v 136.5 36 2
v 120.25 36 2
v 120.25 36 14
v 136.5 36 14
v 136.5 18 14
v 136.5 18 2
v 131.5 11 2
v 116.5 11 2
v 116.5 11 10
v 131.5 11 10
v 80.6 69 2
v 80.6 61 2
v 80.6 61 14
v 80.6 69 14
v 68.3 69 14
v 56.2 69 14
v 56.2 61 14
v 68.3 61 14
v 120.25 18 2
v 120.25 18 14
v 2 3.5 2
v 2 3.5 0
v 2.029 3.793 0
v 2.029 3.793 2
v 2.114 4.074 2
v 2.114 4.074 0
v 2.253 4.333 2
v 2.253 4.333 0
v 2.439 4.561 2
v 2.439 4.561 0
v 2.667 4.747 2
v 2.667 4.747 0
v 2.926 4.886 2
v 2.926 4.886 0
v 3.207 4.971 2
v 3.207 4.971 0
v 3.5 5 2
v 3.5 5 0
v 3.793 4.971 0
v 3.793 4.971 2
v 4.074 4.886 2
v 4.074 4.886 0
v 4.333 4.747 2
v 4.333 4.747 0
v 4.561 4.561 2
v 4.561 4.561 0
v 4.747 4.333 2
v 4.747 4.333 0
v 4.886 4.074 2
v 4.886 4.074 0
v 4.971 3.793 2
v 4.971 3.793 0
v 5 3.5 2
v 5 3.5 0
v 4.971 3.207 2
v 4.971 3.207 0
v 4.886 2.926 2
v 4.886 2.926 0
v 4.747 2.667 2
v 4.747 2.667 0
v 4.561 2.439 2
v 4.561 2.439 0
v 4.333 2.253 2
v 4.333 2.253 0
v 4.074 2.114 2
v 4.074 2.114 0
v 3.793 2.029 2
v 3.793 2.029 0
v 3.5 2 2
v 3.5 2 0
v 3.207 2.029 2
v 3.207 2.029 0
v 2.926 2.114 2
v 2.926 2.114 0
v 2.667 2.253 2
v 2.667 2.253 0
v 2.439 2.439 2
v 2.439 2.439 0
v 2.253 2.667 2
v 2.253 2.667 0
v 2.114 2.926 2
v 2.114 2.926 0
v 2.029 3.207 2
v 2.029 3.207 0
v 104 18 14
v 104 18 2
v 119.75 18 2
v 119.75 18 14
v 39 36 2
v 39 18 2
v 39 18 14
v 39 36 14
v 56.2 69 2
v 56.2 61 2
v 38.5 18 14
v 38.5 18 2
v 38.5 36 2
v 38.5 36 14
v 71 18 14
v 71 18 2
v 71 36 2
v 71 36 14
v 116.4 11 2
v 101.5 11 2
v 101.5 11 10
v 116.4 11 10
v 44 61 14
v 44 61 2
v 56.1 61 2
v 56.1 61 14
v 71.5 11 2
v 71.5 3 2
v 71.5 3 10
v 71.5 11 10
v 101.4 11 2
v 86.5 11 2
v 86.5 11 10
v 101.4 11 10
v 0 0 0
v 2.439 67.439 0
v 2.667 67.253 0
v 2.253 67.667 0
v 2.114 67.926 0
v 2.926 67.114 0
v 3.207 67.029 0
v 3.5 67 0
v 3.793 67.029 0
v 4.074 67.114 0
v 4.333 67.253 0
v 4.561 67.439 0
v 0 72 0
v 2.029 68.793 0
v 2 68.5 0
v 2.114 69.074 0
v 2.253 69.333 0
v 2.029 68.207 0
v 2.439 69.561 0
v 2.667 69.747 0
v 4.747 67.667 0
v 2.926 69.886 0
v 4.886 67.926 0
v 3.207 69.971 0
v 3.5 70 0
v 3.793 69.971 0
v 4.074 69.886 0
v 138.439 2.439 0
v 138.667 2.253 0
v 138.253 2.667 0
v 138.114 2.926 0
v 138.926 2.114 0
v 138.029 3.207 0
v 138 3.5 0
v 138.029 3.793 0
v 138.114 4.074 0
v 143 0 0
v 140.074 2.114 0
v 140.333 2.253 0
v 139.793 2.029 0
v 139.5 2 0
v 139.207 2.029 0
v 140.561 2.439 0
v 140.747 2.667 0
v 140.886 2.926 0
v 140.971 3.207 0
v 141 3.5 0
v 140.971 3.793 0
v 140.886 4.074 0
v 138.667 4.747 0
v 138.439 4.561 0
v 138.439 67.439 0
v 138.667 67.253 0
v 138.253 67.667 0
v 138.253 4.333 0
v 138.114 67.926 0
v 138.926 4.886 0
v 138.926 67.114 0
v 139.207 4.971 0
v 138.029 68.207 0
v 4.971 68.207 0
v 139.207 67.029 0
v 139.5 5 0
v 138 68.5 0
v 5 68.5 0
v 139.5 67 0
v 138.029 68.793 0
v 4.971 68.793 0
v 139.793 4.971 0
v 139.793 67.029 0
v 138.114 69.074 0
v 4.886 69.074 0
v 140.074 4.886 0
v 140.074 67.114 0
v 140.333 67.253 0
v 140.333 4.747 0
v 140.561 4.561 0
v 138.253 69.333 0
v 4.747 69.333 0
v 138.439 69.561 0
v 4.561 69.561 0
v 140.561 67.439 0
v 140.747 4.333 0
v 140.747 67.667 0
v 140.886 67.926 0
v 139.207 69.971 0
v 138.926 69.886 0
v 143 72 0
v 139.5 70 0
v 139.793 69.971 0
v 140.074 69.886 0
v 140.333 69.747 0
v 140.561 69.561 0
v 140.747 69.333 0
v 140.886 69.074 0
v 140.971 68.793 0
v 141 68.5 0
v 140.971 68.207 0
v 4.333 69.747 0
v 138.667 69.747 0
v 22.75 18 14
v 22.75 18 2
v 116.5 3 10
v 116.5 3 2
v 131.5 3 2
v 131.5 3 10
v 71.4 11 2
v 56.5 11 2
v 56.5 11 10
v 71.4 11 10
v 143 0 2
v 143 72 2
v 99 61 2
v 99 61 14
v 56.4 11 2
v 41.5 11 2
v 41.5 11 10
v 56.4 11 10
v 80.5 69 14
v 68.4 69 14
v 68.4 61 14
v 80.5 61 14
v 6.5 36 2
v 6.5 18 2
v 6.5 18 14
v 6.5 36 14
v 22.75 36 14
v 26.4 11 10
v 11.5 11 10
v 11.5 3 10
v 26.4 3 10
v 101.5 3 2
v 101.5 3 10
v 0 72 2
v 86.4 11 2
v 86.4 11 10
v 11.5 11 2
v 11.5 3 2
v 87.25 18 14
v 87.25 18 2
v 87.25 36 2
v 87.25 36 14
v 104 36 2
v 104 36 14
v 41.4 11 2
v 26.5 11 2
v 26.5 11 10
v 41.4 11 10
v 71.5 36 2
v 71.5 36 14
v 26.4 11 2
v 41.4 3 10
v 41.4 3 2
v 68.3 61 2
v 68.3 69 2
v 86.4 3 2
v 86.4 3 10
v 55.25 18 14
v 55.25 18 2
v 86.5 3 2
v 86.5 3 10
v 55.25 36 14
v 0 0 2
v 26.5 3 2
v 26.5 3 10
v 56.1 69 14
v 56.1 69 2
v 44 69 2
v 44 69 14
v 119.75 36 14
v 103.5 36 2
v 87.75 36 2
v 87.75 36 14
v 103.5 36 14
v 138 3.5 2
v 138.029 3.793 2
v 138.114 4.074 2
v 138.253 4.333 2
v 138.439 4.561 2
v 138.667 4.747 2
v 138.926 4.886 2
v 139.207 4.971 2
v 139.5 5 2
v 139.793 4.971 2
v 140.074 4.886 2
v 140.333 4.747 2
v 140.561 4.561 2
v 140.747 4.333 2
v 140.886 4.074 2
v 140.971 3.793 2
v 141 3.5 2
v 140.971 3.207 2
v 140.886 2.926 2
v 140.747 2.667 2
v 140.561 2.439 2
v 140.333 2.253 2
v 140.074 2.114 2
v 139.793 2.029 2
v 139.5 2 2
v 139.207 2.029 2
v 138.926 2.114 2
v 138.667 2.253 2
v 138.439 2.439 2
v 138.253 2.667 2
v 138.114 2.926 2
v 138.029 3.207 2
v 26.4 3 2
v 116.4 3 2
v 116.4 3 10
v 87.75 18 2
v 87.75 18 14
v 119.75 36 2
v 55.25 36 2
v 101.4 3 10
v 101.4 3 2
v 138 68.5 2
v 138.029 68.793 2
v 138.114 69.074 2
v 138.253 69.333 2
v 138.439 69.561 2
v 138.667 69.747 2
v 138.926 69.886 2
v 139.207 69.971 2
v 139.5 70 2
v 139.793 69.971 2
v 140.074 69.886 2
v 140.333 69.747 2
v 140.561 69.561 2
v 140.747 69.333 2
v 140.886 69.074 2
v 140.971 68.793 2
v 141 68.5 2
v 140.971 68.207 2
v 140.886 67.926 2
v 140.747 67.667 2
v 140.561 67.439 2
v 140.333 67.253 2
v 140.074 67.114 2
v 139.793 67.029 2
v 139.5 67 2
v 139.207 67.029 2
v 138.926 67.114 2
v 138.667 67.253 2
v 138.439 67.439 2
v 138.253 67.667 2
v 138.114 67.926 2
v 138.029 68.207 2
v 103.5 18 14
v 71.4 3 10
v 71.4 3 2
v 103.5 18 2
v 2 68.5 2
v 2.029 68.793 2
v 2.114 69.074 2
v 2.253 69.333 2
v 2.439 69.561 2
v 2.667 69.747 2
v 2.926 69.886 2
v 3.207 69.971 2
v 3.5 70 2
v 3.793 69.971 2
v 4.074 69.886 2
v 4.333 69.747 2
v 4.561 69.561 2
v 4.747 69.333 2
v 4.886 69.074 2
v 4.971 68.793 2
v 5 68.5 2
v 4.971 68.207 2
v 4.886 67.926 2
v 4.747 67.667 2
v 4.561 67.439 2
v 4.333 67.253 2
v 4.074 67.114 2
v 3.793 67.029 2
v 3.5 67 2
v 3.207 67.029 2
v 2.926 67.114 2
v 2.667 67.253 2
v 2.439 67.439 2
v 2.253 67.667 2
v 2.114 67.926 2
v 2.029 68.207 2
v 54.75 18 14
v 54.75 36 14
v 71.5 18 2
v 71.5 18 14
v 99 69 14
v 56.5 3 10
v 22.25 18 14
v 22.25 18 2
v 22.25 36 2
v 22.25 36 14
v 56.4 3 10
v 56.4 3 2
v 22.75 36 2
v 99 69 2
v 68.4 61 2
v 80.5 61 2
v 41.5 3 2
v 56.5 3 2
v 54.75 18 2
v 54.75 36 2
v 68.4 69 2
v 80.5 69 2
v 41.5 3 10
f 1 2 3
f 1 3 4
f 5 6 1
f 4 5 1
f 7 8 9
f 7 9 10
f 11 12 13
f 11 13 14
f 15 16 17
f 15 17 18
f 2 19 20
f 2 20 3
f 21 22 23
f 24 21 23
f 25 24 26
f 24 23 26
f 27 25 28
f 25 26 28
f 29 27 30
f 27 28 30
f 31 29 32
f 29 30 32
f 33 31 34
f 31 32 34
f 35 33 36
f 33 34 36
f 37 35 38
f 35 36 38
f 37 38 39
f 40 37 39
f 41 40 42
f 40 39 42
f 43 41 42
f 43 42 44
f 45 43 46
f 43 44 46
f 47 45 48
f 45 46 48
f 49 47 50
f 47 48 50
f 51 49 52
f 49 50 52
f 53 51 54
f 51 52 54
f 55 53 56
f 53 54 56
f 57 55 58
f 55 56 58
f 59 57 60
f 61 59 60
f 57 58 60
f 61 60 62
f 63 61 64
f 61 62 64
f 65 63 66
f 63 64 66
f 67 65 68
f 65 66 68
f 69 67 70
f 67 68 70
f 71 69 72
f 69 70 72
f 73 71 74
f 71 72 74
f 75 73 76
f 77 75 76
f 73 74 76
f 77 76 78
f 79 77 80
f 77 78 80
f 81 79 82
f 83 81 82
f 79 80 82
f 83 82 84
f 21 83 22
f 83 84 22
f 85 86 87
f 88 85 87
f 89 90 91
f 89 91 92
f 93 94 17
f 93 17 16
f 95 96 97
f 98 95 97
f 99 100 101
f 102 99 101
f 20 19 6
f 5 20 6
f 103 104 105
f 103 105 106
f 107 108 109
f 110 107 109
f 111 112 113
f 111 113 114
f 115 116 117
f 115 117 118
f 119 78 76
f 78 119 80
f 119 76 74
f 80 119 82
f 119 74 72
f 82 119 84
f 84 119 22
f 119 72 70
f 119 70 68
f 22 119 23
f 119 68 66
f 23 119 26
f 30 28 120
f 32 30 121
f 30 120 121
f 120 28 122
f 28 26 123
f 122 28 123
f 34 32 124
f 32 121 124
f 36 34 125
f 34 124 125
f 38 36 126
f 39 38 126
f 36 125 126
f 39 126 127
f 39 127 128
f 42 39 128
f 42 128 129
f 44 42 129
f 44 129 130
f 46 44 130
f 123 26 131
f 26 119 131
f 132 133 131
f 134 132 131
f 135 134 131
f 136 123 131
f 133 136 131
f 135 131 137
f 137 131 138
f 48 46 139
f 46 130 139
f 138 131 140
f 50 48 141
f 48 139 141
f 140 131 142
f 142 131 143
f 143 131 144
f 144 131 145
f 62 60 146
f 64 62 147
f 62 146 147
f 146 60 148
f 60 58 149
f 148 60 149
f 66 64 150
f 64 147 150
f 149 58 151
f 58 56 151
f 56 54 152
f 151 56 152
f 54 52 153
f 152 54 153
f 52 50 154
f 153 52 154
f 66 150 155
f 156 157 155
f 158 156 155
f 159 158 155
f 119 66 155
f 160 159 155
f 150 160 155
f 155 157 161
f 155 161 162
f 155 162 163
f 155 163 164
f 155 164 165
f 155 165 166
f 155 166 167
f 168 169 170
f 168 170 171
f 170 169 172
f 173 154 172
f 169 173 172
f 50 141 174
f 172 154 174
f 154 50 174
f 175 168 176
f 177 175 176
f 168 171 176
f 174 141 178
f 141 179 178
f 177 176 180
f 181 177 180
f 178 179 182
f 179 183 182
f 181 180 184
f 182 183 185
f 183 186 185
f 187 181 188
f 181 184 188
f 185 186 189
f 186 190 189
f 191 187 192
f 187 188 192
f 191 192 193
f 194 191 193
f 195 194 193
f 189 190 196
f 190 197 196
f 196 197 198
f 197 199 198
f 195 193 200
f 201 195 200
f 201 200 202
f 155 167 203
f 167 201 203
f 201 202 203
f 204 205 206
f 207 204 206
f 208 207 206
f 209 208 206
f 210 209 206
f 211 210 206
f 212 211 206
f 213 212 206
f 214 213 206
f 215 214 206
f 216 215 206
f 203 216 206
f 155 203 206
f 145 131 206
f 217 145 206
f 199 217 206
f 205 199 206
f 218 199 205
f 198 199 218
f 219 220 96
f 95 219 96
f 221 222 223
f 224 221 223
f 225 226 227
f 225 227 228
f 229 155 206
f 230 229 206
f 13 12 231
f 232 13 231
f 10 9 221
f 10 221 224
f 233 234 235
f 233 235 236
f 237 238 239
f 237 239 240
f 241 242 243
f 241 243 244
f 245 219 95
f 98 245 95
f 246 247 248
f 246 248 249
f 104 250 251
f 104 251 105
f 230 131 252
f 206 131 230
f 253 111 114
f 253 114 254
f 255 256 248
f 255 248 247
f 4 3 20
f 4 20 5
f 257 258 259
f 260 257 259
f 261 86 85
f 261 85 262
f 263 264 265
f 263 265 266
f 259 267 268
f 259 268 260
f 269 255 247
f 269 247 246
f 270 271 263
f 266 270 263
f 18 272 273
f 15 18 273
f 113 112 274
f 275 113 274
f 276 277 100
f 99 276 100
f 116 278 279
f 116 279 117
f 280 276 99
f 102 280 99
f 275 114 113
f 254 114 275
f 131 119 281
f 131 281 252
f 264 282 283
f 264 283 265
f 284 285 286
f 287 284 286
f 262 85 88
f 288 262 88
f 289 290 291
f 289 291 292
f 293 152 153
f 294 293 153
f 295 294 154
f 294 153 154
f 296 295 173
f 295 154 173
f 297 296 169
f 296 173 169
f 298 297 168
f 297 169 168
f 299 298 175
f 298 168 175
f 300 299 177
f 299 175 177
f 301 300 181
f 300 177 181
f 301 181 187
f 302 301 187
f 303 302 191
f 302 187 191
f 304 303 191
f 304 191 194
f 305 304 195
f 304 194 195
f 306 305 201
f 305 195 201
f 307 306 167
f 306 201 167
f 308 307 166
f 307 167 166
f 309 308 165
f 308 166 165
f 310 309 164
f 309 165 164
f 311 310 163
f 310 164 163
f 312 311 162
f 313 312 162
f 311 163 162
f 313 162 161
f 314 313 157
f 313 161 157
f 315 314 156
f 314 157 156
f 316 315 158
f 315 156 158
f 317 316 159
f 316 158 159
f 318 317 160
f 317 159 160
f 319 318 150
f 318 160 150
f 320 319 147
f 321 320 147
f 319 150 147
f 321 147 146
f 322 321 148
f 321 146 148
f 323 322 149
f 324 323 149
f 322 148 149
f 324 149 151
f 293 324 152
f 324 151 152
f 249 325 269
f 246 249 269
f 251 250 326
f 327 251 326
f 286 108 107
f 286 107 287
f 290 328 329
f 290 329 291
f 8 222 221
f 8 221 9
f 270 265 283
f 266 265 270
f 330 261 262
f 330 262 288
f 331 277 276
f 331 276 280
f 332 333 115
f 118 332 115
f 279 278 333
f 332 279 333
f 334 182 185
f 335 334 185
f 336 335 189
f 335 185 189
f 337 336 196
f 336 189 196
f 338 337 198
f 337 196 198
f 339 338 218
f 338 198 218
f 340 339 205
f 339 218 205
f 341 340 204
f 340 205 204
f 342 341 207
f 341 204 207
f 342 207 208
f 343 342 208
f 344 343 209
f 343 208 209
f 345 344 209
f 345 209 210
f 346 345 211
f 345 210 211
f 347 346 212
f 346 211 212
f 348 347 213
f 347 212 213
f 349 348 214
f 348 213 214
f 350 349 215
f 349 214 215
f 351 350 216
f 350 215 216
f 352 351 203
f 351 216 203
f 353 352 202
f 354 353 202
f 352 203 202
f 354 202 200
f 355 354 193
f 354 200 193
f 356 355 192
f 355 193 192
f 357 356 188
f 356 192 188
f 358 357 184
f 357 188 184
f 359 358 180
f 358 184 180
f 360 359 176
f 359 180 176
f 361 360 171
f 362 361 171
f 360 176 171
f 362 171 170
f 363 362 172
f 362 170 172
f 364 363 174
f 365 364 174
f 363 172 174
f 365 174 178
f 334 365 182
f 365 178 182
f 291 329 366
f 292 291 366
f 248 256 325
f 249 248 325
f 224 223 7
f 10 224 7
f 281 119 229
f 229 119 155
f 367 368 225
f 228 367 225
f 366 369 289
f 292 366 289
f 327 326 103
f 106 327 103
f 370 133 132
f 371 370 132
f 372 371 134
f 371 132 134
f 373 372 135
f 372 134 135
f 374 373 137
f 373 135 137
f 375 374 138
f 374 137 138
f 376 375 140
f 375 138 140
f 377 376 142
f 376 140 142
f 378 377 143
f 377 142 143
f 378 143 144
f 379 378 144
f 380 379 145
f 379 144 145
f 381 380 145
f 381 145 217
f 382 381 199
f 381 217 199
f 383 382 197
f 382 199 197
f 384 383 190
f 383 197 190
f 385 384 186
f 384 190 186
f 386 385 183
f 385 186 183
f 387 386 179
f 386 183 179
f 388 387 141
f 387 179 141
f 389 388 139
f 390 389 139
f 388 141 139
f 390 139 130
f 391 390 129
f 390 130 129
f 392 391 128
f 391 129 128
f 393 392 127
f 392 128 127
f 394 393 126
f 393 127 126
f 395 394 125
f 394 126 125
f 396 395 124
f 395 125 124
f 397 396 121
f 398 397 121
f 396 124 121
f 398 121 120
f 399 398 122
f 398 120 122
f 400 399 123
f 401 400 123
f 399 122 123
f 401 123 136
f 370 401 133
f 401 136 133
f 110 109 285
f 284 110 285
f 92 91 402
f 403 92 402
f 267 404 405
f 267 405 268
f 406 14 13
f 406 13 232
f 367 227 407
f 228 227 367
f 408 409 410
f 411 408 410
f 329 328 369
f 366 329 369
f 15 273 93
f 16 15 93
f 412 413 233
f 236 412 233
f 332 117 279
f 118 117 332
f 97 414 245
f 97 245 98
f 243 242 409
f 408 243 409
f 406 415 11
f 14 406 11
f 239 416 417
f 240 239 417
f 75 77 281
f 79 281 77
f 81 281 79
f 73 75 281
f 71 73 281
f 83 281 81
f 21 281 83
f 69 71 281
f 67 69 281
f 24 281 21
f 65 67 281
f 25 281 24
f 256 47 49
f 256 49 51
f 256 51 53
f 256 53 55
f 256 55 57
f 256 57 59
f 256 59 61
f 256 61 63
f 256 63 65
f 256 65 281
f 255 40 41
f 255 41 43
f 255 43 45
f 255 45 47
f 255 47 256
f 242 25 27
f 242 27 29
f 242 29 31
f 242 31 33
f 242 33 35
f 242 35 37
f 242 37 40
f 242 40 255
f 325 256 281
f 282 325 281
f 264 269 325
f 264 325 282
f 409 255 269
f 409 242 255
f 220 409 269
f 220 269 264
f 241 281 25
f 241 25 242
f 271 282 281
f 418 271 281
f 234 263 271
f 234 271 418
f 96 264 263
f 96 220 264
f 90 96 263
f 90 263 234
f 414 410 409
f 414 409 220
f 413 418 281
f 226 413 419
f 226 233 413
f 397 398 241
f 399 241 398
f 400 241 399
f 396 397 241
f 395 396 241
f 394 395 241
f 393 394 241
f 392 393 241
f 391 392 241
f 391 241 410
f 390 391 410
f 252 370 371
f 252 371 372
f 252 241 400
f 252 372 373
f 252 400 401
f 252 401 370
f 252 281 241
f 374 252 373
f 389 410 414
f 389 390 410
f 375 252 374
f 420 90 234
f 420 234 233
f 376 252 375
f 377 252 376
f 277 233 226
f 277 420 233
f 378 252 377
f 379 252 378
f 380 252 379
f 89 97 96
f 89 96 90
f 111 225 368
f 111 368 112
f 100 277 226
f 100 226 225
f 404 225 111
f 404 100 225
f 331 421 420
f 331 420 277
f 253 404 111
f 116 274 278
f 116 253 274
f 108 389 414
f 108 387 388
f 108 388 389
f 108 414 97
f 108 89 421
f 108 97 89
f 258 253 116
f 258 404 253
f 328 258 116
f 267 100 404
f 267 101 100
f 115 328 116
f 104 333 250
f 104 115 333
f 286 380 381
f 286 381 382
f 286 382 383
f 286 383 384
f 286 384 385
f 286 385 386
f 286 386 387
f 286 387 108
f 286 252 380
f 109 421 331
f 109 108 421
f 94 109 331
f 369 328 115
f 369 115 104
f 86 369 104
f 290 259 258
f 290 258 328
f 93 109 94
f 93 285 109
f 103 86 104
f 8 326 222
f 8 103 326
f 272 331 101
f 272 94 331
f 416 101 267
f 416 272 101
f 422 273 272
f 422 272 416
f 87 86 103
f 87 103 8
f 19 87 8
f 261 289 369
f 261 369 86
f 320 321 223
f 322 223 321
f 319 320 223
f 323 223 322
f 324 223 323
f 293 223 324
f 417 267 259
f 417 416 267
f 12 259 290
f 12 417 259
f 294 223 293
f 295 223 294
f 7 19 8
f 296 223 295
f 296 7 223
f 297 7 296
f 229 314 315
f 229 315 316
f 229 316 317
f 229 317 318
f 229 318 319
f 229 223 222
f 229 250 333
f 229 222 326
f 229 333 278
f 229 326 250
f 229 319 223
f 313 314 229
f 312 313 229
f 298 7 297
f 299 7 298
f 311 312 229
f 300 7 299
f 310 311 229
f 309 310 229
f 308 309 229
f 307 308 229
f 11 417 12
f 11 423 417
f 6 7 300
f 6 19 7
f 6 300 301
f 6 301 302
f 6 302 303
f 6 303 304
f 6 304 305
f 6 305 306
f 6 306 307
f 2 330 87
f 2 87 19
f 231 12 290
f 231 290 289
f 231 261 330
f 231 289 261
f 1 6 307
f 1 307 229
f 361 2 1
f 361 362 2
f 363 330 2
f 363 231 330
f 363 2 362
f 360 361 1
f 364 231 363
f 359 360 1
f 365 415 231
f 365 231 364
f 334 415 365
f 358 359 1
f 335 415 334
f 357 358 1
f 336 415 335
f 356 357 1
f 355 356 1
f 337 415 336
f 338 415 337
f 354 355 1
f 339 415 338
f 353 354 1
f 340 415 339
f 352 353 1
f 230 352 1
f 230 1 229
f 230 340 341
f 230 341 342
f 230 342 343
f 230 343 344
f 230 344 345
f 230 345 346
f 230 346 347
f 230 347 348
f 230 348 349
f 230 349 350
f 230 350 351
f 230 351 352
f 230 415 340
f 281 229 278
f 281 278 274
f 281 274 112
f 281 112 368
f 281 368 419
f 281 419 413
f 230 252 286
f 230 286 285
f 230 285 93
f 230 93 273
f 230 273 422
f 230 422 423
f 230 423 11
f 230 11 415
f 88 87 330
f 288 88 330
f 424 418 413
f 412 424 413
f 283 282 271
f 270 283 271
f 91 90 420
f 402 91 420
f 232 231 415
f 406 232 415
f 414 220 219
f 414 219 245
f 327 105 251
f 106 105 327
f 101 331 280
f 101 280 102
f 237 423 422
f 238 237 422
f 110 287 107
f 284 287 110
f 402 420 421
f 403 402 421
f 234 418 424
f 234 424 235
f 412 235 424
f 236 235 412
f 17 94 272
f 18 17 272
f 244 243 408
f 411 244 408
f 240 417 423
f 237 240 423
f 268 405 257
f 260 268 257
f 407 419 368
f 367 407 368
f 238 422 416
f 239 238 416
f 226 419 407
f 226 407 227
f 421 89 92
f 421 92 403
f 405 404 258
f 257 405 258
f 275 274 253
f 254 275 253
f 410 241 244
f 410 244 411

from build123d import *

# Parameters (mm, degrees)
SKETCH_1_W          = 143
SKETCH_1_H          = 72
EXTRUDE_1_DEPTH     = 2
SKETCH_2_R          = 1.5
CUT_EXTRUDE_1_DEPTH = 2
SKETCH_3_W          = 14.9
SKETCH_3_H          = 8
SKETCH_3_W_2        = 15
EXTRUDE_2_DEPTH     = 8
SKETCH_3_3_W        = 15.75
SKETCH_3_3_H        = 18
SKETCH_3_3_W_2      = 16.25
EXTRUDE_3_DEPTH     = 12
SKETCH_3_4_W        = 6.1
SKETCH_3_4_H        = 8
SKETCH_3_4_W_2      = 6
SKETCH_3_4_W_3      = 6.2
EXTRUDE_4_DEPTH     = 12


with BuildPart() as part:
    # 草图1 → 凸台-拉伸1 (new body)
    with BuildSketch(Plane.XY):
        with Locations((71.5, 36)):
            Rectangle(SKETCH_1_W, SKETCH_1_H)
    extrude(amount=EXTRUDE_1_DEPTH)

    # 草图2 → 切除-拉伸1 (cut)
    with BuildSketch(Plane(origin=(0, 0, 0), x_dir=(-1, 0, 0), z_dir=(0, 0, -1))):
        with Locations((-139.5, 68.5)):
            Circle(SKETCH_2_R)
        with Locations((-139.5, 3.5)):
            Circle(SKETCH_2_R)
        with Locations((-3.5, 68.5)):
            Circle(SKETCH_2_R)
        with Locations((-3.5, 3.5)):
            Circle(SKETCH_2_R)
    extrude(amount=-CUT_EXTRUDE_1_DEPTH, mode=Mode.SUBTRACT)

    # 草图3 → 凸台-拉伸2 (add)
    with BuildSketch(Plane.XY.offset(2)):
        with Locations((78.95, 7)):
            Rectangle(SKETCH_3_W, SKETCH_3_H)
        with Locations((63.95, 7)):
            Rectangle(SKETCH_3_W, SKETCH_3_H)
        with Locations((93.95, 7)):
            Rectangle(SKETCH_3_W, SKETCH_3_H)
        with Locations((48.95, 7)):
            Rectangle(SKETCH_3_W, SKETCH_3_H)
        with Locations((108.95, 7)):
            Rectangle(SKETCH_3_W, SKETCH_3_H)
        with Locations((33.95, 7)):
            Rectangle(SKETCH_3_W, SKETCH_3_H)
        with Locations((124, 7)):
            Rectangle(SKETCH_3_W_2, SKETCH_3_H)
        with Locations((18.95, 7)):
            Rectangle(SKETCH_3_W, SKETCH_3_H)
    extrude(amount=EXTRUDE_2_DEPTH)

    # 草图3<3> → 凸台-拉伸3 (add)
    with BuildSketch(Plane.XY.offset(2)):
        with Locations((79.375, 27)):
            Rectangle(SKETCH_3_3_W, SKETCH_3_3_H)
        with Locations((63.125, 27)):
            Rectangle(SKETCH_3_3_W, SKETCH_3_3_H)
        with Locations((95.625, 27)):
            Rectangle(SKETCH_3_3_W, SKETCH_3_3_H)
        with Locations((46.875, 27)):
            Rectangle(SKETCH_3_3_W, SKETCH_3_3_H)
        with Locations((111.875, 27)):
            Rectangle(SKETCH_3_3_W, SKETCH_3_3_H)
        with Locations((30.625, 27)):
            Rectangle(SKETCH_3_3_W, SKETCH_3_3_H)
        with Locations((128.375, 27)):
            Rectangle(SKETCH_3_3_W_2, SKETCH_3_3_H)
        with Locations((14.375, 27)):
            Rectangle(SKETCH_3_3_W, SKETCH_3_3_H)
    extrude(amount=EXTRUDE_3_DEPTH)

    # 草图3<4> → 凸台-拉伸4 (add)
    with BuildSketch(Plane.XY.offset(2)):
        with Locations((47.05, 65)):
            Rectangle(SKETCH_3_4_W, SKETCH_3_4_H)
        with Locations((53.1, 65)):
            Rectangle(SKETCH_3_4_W_2, SKETCH_3_4_H)
        with Locations((59.25, 65)):
            Rectangle(SKETCH_3_4_W, SKETCH_3_4_H)
        with Locations((65.3, 65)):
            Rectangle(SKETCH_3_4_W_2, SKETCH_3_4_H)
        Polygon((68.4, 69), (68.4, 61), (74.5, 61), (74.5, 69), (71.5, 69), align=None)
        with Locations((77.5, 65)):
            Rectangle(SKETCH_3_4_W_2, SKETCH_3_4_H)
        with Locations((83.65, 65)):
            Rectangle(SKETCH_3_4_W, SKETCH_3_4_H)
        with Locations((89.75, 65)):
            Rectangle(SKETCH_3_4_W, SKETCH_3_4_H)
        with Locations((95.9, 65)):
            Rectangle(SKETCH_3_4_W_3, SKETCH_3_4_H)
    extrude(amount=EXTRUDE_4_DEPTH)


solid = part.part
